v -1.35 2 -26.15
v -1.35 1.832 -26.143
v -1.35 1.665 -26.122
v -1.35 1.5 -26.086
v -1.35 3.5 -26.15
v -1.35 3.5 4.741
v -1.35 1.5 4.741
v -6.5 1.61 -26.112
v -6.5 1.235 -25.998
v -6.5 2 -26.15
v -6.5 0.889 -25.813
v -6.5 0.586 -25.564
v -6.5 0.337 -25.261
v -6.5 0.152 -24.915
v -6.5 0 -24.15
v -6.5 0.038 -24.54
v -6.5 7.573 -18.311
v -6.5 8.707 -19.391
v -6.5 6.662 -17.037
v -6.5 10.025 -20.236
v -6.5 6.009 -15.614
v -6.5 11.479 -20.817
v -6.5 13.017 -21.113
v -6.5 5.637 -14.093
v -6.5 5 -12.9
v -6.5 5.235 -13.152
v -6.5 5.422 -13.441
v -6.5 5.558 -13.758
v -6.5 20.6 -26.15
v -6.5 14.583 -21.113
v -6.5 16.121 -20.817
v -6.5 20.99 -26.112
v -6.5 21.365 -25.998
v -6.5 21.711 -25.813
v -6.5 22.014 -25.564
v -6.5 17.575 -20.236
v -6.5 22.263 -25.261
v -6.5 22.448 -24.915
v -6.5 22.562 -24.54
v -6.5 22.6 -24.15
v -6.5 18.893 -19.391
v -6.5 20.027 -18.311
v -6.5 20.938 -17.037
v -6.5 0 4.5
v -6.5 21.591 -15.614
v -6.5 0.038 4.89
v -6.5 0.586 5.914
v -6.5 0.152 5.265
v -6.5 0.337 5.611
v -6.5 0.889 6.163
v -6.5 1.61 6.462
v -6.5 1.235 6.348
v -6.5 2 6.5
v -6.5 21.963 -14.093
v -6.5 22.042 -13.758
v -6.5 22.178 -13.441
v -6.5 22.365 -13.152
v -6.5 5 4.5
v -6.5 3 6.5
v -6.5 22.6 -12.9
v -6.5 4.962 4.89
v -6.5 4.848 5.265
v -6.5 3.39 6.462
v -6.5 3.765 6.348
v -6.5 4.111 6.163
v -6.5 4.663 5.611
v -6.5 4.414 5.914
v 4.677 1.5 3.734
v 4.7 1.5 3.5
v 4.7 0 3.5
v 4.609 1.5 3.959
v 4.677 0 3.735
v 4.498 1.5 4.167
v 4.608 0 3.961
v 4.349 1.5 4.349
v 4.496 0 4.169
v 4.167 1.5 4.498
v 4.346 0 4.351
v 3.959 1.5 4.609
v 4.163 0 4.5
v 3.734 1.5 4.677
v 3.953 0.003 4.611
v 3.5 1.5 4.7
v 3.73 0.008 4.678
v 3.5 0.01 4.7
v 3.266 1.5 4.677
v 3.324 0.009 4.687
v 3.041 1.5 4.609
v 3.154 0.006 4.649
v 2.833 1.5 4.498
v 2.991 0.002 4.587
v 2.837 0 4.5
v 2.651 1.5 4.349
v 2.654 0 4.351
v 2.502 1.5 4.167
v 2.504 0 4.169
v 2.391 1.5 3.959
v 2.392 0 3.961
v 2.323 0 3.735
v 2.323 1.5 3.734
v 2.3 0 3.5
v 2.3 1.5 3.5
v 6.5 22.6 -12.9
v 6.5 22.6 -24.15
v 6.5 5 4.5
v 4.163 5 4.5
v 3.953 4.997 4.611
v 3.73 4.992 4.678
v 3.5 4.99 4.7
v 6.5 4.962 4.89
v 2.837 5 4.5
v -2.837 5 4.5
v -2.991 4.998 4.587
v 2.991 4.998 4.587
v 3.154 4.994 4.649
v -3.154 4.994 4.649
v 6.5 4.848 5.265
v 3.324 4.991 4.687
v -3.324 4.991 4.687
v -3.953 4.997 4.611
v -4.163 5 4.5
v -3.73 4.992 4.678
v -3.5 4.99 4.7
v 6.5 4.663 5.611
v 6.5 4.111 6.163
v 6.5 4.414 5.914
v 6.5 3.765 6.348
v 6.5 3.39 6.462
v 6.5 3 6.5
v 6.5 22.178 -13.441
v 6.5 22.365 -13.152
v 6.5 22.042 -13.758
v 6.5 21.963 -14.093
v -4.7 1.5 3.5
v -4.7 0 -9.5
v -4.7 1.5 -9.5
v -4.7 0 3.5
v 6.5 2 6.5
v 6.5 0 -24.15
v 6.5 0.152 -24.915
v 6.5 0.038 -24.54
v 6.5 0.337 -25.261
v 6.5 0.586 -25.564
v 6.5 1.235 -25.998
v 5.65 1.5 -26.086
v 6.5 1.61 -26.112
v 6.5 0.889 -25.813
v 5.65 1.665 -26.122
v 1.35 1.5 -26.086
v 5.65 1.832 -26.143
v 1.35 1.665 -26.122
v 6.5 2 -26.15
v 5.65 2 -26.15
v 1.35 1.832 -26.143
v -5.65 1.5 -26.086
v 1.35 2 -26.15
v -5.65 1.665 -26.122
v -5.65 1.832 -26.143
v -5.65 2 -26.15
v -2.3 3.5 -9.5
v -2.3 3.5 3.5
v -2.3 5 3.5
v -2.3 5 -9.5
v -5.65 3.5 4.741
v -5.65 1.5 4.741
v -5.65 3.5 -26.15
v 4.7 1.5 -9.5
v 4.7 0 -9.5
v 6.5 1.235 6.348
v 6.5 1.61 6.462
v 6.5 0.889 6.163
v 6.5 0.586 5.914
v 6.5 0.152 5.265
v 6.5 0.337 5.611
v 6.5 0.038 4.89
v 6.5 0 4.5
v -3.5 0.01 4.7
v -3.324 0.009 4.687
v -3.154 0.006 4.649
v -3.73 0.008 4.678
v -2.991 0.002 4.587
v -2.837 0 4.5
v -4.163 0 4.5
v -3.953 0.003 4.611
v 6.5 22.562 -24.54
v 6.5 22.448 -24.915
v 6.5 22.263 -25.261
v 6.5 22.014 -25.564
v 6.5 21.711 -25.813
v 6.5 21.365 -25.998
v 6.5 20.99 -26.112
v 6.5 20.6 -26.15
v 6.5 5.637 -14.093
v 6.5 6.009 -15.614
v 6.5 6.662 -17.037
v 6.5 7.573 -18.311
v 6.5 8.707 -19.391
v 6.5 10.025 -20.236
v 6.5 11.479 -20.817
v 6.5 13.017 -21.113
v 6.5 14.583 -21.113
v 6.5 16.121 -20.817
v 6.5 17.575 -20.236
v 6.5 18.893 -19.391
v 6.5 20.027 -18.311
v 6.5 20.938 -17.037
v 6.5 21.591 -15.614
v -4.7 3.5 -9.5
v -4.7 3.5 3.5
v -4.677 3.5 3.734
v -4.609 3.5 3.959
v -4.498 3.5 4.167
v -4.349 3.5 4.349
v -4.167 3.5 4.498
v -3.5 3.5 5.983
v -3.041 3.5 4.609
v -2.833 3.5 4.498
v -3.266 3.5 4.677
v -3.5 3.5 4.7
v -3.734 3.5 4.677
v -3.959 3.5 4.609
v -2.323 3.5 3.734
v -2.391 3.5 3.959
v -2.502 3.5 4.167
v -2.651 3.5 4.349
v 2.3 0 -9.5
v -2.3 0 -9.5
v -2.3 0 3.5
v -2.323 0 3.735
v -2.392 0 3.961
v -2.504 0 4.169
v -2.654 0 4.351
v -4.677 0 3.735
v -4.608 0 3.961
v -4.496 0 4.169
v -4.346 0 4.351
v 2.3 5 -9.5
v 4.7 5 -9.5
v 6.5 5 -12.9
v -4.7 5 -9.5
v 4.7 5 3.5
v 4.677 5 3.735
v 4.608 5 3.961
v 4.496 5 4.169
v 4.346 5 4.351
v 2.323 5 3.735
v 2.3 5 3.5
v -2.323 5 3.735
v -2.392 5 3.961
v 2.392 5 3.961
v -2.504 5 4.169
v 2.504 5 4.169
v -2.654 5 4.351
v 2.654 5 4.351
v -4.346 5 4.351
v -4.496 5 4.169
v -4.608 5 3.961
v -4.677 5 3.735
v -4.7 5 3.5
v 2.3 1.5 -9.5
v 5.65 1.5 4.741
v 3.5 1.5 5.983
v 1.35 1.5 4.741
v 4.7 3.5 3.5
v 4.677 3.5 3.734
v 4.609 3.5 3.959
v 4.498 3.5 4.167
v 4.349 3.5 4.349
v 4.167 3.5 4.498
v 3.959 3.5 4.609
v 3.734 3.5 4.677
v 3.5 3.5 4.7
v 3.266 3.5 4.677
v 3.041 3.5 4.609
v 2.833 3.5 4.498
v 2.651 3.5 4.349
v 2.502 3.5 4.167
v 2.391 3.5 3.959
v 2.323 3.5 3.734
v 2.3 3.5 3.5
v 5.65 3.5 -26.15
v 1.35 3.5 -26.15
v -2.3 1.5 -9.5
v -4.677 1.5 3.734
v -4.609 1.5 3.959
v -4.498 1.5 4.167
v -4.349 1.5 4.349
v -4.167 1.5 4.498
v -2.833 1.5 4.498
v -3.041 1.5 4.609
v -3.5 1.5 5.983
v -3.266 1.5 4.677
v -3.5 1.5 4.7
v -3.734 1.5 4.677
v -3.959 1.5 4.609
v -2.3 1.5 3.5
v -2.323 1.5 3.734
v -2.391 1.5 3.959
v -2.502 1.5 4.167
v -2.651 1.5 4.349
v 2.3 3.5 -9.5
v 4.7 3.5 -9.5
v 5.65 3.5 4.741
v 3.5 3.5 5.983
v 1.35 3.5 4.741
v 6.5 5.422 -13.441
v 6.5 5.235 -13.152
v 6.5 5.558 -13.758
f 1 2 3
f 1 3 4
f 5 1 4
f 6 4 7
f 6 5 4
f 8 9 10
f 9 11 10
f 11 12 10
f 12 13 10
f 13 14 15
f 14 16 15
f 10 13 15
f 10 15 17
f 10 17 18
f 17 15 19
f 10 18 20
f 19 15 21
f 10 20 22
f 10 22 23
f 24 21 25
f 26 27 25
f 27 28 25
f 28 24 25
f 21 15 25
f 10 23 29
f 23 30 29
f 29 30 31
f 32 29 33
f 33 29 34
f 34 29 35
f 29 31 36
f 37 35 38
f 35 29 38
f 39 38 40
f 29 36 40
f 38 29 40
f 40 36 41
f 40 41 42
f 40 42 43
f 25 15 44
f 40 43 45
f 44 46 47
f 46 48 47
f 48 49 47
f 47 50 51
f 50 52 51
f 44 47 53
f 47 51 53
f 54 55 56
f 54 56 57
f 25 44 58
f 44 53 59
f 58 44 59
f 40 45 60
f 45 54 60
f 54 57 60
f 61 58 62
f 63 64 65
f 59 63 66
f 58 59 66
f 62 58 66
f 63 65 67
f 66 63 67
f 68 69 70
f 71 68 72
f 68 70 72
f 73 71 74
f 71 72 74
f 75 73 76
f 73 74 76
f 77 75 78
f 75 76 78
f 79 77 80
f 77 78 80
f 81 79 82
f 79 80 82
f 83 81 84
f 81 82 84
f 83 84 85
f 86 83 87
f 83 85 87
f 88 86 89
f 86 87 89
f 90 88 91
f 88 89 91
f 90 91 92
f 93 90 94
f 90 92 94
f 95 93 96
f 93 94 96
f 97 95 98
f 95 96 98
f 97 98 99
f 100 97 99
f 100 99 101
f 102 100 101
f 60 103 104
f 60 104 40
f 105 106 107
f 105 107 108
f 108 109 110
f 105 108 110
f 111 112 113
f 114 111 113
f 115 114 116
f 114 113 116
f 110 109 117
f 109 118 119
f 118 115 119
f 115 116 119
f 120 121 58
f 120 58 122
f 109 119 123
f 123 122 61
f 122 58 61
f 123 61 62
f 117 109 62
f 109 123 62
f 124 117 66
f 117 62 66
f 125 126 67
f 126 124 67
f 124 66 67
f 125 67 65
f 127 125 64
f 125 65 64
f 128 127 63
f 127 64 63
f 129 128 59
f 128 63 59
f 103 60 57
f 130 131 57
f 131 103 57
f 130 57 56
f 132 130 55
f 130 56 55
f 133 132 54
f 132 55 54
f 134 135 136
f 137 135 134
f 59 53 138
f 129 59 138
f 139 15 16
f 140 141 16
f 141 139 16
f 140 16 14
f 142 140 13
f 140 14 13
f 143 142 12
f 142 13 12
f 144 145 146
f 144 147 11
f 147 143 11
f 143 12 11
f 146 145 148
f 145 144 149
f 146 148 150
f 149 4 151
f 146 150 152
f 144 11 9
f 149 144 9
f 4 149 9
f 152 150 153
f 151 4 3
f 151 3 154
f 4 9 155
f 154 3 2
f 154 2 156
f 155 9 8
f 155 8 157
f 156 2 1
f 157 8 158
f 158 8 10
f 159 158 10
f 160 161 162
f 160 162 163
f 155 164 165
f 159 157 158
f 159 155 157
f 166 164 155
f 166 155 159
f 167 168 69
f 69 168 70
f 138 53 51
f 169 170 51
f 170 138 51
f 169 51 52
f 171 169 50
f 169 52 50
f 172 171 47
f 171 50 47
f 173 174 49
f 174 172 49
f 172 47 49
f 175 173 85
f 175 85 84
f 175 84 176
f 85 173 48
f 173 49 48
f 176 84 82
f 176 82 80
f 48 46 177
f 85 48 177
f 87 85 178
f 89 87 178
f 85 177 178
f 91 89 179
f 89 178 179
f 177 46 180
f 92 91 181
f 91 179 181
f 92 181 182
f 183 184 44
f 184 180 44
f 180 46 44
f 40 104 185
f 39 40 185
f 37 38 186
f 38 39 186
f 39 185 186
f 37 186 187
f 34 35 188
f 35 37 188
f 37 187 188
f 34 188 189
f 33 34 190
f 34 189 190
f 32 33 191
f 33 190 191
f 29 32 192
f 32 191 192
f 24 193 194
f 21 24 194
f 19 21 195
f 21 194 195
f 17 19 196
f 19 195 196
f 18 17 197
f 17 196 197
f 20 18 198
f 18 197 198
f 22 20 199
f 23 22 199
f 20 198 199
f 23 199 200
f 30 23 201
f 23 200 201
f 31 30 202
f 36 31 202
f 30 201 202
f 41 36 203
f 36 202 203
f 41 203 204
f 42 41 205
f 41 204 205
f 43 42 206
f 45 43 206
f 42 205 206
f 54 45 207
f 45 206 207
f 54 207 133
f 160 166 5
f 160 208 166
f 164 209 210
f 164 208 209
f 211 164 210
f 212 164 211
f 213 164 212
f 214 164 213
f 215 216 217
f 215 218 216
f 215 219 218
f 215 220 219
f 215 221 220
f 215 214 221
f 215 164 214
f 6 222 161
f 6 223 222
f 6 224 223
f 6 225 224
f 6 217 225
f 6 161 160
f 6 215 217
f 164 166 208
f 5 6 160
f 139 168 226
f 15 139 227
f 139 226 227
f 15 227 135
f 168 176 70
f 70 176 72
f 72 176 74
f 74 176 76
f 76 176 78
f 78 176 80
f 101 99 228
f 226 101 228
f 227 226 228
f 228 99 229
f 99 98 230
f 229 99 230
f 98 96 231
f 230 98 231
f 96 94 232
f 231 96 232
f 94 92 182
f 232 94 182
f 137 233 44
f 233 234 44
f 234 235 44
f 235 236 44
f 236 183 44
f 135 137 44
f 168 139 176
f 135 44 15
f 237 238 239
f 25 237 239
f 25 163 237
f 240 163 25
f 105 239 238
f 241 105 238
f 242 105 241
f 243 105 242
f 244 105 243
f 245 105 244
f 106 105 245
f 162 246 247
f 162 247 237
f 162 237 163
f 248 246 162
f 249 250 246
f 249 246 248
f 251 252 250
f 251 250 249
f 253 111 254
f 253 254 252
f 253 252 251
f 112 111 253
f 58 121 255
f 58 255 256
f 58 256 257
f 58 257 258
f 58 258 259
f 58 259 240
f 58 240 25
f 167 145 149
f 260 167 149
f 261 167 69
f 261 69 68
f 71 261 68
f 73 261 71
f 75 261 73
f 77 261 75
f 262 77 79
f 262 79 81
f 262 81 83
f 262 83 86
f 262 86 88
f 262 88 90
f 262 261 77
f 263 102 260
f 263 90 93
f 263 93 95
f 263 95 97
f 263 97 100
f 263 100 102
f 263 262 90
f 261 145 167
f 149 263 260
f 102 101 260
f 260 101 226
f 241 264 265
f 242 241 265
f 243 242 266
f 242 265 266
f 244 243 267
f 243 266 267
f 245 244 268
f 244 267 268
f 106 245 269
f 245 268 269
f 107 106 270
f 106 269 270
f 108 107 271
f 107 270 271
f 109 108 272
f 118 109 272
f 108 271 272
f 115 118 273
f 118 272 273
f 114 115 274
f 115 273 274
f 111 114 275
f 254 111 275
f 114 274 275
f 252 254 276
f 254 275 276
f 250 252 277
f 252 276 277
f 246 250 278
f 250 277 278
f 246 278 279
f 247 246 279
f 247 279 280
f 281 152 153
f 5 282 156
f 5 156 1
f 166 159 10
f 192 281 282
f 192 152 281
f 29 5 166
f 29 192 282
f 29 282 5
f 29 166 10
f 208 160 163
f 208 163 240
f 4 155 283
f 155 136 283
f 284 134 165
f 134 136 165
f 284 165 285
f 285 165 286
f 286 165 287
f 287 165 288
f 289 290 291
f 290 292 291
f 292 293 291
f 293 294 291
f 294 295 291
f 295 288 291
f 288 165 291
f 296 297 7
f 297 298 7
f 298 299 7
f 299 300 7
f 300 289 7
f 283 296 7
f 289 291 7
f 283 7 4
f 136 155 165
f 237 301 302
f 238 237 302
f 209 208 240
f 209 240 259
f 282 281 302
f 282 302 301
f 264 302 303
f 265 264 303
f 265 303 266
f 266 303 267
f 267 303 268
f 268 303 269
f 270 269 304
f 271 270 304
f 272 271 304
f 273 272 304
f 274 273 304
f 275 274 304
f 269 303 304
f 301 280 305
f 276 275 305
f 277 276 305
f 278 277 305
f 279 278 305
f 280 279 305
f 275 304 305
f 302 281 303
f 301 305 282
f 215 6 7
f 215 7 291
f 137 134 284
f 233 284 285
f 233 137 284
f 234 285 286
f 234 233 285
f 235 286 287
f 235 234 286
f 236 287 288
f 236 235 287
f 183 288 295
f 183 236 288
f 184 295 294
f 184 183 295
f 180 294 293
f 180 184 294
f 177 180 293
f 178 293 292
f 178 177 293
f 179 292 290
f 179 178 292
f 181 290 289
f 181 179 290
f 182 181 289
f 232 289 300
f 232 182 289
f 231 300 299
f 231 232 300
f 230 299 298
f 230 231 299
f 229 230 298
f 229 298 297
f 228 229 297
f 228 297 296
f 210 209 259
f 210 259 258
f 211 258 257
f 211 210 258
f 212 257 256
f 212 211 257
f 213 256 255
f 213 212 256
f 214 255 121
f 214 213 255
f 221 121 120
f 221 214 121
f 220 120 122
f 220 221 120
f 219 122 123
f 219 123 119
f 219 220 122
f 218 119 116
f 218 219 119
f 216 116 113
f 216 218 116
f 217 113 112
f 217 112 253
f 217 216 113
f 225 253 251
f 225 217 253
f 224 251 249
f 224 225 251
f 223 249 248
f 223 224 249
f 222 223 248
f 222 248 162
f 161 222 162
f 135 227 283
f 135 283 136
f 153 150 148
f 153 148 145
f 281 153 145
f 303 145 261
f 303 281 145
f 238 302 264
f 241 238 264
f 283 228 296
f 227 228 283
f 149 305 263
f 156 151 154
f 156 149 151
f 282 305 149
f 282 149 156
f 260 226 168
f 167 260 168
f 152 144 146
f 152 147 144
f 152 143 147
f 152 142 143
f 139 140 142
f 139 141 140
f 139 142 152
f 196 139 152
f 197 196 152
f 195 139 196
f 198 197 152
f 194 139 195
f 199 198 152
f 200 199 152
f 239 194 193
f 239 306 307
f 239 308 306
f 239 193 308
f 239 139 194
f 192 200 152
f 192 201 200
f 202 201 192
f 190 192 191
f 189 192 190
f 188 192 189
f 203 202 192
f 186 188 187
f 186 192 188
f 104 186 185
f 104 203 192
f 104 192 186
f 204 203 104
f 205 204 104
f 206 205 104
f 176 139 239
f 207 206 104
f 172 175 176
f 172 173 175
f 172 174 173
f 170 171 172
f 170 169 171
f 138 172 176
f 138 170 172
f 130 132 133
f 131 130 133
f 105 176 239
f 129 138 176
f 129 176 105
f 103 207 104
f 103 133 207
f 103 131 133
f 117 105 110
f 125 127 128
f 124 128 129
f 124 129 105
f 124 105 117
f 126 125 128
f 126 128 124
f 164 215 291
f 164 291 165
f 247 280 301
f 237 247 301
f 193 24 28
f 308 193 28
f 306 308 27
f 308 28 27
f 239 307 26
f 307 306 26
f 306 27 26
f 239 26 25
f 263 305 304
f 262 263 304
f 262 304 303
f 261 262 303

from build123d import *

# Parameters (mm, degrees)
SKETCH1_W               = 13
SKETCH1_H               = 13
BOSS_EXTRUDE1_DEPTH     = 5
SKETCH2_W               = 13
SKETCH2_H               = 5
BOSS_EXTRUDE2_DEPTH     = 16.4
SKETCH3_W               = 13
SKETCH3_H               = 10
BOSS_EXTRUDE3_DEPTH     = 17.6
SKETCH4_R               = 8.25
CUT_EXTRUDE1_DEPTH      = 13
SKETCH5_W               = 13
SKETCH5_H               = 22.6
BOSS_EXTRUDE4_DEPTH     = 3.25
CUT_EXTRUDE2_DEPTH      = 1
CUT_EXTRUDE2_DEPTH_BACK = 1
CUT_EXTRUDE2_START      = -2.5
CUT_EXTRUDE3_REACH      = 37.169
FILLET2_R               = 2


with BuildPart() as part:
    # Sketch1 → Boss-Extrude1 (new body)
    with BuildSketch(Plane(origin=(0, 0, 0), x_dir=(1, 0, 0), z_dir=(0, 1, 0))):
        Rectangle(SKETCH1_W, SKETCH1_H)
    extrude(amount=BOSS_EXTRUDE1_DEPTH)

    # Sketch2 → Boss-Extrude2 (add)
    with BuildSketch(Plane(origin=(0, 0, -6.5), x_dir=(-1, 0, 0), z_dir=(0, 0, -1))):
        with Locations((0, 2.5)):
            Rectangle(SKETCH2_W, SKETCH2_H)
    extrude(amount=BOSS_EXTRUDE2_DEPTH)

    # Sketch3 → Boss-Extrude3 (add)
    with BuildSketch(Plane(origin=(0, 5, 0), x_dir=(1, 0, 0), z_dir=(0, 1, 0))):
        with Locations((0, 17.9)):
            Rectangle(SKETCH3_W, SKETCH3_H)
    extrude(amount=BOSS_EXTRUDE3_DEPTH)

    # Sketch4 → Cut-Extrude1 (cut)
    with BuildSketch(Plane(origin=(6.5, 0, 0), x_dir=(0, 0, -1), z_dir=(1, 0, 0))):
        with Locations((12.9, 13.8)):
            Circle(SKETCH4_R)
    extrude(amount=-CUT_EXTRUDE1_DEPTH, mode=Mode.SUBTRACT)

    # Sketch5 → Boss-Extrude4 (add)
    with BuildSketch(Plane(origin=(0, 0, -22.9), x_dir=(-1, 0, 0), z_dir=(0, 0, -1))):
        with Locations((0, 11.3)):
            Rectangle(SKETCH5_W, SKETCH5_H)
    extrude(amount=BOSS_EXTRUDE4_DEPTH)

    # Sketch6 → Cut-Extrude2 (cut, two sides: drawn at the far end of the back side and taken through both)
    with BuildSketch(Plane.XZ.offset(CUT_EXTRUDE2_START - CUT_EXTRUDE2_DEPTH_BACK)):
        Polygon((5.65, 2.258696921), (5.65, -26.15), (1.35, -26.15), (1.35, 2.258696921), (1.35, 4.741303079), (3.5, 5.982606158), (5.65, 4.741303079), align=None)
        Polygon((-1.35, 2.258696921), (-1.35, 4.741303079), (-3.5, 5.982606158), (-5.65, 4.741303079), (-5.65, 2.258696921), (-5.65, -26.15), (-1.35, -26.15), align=None)
    extrude(amount=CUT_EXTRUDE2_DEPTH + CUT_EXTRUDE2_DEPTH_BACK, mode=Mode.SUBTRACT)

    # Cut-Extrude3: up to this face of the body (flat: up to its plane)
    cut_extrude3_end = Plane(part.part.faces().sort_by_distance((0, 5, -3.2))[0])
    # Sketch7 → Cut-Extrude3 (cut, up to the picked face)
    with BuildSketch(Plane.XZ, mode=Mode.PRIVATE) as cut_extrude3_sk1:
        with BuildLine():
            Line((-2.3, 3.5), (-2.3, -9.5))
            Line((-2.3, -9.5), (-4.7, -9.5))
            Line((-4.7, -9.5), (-4.7, 3.5))
            ThreePointArc((-4.7, 3.5), (-3.5, 4.7), (-2.3, 3.5))
        make_face()
    cut_extrude3_tool1 = split(extrude(cut_extrude3_sk1.sketch, amount=-CUT_EXTRUDE3_REACH, mode=Mode.PRIVATE), bisect_by=cut_extrude3_end, keep=Keep.BOTH, mode=Mode.PRIVATE)
    # Sketch7 → Cut-Extrude3 (cut, up to the picked face)
    with BuildSketch(Plane.XZ, mode=Mode.PRIVATE) as cut_extrude3_sk2:
        with BuildLine():
            Line((2.3, 3.5), (2.3, -9.5))
            Line((2.3, -9.5), (4.7, -9.5))
            Line((4.7, -9.5), (4.7, 3.5))
            ThreePointArc((4.7, 3.5), (3.5, 4.7), (2.3, 3.5))
        make_face()
    cut_extrude3_tool2 = split(extrude(cut_extrude3_sk2.sketch, amount=-CUT_EXTRUDE3_REACH, mode=Mode.PRIVATE), bisect_by=cut_extrude3_end, keep=Keep.BOTH, mode=Mode.PRIVATE)
    add(cut_extrude3_tool1.solids().sort_by(Axis((-3.5, 0, -2.526189), (0, 1, 0)))[0], mode=Mode.SUBTRACT)
    add(cut_extrude3_tool2.solids().sort_by(Axis((3.5, 0, -2.526189), (0, 1, 0)))[0], mode=Mode.SUBTRACT)

    # Fillet2
    # the kernel refuses this fillet: 2 mm, written as the material it takes off along each edge
    with BuildSketch(Plane(origin=(-11.5, 0, 6.5), x_dir=(0, 1, 0), z_dir=(1, 0, 0)), Plane(origin=(-11.5, 0, -26.15), x_dir=(0, 0, 1), z_dir=(1, 0, 0))) as fillet2_piece_1:
        with BuildLine():
            CenterArc((FILLET2_R, -FILLET2_R), FILLET2_R, 90, 90)
            Line((0, -FILLET2_R), (0, 0))
            Line((0, 0), (FILLET2_R, 0))
        make_face()
    extrude(amount=23, mode=Mode.SUBTRACT)
    with BuildSketch(Plane(origin=(-11.5, 5, 6.5), x_dir=(0, -1, 0), z_dir=(1, 0, 0)), Plane(origin=(11.5, 22.6, -26.15), x_dir=(0, -1, 0), z_dir=(-1, 0, 0))) as fillet2_piece_2:
        with BuildLine():
            CenterArc((FILLET2_R, FILLET2_R), FILLET2_R, 180, 90)
            Line((0, FILLET2_R), (0, 0))
            Line((0, 0), (FILLET2_R, 0))
        make_face()
    extrude(amount=23, mode=Mode.SUBTRACT)
    with BuildSketch(Plane(origin=(-9.491448846, 5.55, -12.9), x_dir=(0, 0.0725199720178057, -0.9973669603804493), z_dir=(1, 0, 0))) as fillet2_piece_3:
        with BuildLine():
            CenterArc((1.341619482, -1.994733921), FILLET2_R, 94.15873901, 39.530984807)
            Line((-0.039885985, -0.548551828), (0, 0))
            ThreePointArc((0, 0), (0.598289769, -0.021722577), (1.196579538, 0))
        make_face()
    extrude(amount=18.982897691, mode=Mode.SUBTRACT)
    with BuildSketch(Plane(origin=(-9.491448846, 22.05, -12.9), x_dir=(0, 1, 0), z_dir=(1, 0, 0))) as fillet2_piece_4:
        with BuildLine():
            CenterArc((1.8921875, -1.482744993), FILLET2_R, 132.151537174, 39.530984807)
            ThreePointArc((-0.086775915, -1.193428897), (-0.021722577, -0.598289769), (0, 0))
            Line((0, 0), (0.55, 0))
        make_face()
    extrude(amount=18.982897691, mode=Mode.SUBTRACT)


solid = part.part
